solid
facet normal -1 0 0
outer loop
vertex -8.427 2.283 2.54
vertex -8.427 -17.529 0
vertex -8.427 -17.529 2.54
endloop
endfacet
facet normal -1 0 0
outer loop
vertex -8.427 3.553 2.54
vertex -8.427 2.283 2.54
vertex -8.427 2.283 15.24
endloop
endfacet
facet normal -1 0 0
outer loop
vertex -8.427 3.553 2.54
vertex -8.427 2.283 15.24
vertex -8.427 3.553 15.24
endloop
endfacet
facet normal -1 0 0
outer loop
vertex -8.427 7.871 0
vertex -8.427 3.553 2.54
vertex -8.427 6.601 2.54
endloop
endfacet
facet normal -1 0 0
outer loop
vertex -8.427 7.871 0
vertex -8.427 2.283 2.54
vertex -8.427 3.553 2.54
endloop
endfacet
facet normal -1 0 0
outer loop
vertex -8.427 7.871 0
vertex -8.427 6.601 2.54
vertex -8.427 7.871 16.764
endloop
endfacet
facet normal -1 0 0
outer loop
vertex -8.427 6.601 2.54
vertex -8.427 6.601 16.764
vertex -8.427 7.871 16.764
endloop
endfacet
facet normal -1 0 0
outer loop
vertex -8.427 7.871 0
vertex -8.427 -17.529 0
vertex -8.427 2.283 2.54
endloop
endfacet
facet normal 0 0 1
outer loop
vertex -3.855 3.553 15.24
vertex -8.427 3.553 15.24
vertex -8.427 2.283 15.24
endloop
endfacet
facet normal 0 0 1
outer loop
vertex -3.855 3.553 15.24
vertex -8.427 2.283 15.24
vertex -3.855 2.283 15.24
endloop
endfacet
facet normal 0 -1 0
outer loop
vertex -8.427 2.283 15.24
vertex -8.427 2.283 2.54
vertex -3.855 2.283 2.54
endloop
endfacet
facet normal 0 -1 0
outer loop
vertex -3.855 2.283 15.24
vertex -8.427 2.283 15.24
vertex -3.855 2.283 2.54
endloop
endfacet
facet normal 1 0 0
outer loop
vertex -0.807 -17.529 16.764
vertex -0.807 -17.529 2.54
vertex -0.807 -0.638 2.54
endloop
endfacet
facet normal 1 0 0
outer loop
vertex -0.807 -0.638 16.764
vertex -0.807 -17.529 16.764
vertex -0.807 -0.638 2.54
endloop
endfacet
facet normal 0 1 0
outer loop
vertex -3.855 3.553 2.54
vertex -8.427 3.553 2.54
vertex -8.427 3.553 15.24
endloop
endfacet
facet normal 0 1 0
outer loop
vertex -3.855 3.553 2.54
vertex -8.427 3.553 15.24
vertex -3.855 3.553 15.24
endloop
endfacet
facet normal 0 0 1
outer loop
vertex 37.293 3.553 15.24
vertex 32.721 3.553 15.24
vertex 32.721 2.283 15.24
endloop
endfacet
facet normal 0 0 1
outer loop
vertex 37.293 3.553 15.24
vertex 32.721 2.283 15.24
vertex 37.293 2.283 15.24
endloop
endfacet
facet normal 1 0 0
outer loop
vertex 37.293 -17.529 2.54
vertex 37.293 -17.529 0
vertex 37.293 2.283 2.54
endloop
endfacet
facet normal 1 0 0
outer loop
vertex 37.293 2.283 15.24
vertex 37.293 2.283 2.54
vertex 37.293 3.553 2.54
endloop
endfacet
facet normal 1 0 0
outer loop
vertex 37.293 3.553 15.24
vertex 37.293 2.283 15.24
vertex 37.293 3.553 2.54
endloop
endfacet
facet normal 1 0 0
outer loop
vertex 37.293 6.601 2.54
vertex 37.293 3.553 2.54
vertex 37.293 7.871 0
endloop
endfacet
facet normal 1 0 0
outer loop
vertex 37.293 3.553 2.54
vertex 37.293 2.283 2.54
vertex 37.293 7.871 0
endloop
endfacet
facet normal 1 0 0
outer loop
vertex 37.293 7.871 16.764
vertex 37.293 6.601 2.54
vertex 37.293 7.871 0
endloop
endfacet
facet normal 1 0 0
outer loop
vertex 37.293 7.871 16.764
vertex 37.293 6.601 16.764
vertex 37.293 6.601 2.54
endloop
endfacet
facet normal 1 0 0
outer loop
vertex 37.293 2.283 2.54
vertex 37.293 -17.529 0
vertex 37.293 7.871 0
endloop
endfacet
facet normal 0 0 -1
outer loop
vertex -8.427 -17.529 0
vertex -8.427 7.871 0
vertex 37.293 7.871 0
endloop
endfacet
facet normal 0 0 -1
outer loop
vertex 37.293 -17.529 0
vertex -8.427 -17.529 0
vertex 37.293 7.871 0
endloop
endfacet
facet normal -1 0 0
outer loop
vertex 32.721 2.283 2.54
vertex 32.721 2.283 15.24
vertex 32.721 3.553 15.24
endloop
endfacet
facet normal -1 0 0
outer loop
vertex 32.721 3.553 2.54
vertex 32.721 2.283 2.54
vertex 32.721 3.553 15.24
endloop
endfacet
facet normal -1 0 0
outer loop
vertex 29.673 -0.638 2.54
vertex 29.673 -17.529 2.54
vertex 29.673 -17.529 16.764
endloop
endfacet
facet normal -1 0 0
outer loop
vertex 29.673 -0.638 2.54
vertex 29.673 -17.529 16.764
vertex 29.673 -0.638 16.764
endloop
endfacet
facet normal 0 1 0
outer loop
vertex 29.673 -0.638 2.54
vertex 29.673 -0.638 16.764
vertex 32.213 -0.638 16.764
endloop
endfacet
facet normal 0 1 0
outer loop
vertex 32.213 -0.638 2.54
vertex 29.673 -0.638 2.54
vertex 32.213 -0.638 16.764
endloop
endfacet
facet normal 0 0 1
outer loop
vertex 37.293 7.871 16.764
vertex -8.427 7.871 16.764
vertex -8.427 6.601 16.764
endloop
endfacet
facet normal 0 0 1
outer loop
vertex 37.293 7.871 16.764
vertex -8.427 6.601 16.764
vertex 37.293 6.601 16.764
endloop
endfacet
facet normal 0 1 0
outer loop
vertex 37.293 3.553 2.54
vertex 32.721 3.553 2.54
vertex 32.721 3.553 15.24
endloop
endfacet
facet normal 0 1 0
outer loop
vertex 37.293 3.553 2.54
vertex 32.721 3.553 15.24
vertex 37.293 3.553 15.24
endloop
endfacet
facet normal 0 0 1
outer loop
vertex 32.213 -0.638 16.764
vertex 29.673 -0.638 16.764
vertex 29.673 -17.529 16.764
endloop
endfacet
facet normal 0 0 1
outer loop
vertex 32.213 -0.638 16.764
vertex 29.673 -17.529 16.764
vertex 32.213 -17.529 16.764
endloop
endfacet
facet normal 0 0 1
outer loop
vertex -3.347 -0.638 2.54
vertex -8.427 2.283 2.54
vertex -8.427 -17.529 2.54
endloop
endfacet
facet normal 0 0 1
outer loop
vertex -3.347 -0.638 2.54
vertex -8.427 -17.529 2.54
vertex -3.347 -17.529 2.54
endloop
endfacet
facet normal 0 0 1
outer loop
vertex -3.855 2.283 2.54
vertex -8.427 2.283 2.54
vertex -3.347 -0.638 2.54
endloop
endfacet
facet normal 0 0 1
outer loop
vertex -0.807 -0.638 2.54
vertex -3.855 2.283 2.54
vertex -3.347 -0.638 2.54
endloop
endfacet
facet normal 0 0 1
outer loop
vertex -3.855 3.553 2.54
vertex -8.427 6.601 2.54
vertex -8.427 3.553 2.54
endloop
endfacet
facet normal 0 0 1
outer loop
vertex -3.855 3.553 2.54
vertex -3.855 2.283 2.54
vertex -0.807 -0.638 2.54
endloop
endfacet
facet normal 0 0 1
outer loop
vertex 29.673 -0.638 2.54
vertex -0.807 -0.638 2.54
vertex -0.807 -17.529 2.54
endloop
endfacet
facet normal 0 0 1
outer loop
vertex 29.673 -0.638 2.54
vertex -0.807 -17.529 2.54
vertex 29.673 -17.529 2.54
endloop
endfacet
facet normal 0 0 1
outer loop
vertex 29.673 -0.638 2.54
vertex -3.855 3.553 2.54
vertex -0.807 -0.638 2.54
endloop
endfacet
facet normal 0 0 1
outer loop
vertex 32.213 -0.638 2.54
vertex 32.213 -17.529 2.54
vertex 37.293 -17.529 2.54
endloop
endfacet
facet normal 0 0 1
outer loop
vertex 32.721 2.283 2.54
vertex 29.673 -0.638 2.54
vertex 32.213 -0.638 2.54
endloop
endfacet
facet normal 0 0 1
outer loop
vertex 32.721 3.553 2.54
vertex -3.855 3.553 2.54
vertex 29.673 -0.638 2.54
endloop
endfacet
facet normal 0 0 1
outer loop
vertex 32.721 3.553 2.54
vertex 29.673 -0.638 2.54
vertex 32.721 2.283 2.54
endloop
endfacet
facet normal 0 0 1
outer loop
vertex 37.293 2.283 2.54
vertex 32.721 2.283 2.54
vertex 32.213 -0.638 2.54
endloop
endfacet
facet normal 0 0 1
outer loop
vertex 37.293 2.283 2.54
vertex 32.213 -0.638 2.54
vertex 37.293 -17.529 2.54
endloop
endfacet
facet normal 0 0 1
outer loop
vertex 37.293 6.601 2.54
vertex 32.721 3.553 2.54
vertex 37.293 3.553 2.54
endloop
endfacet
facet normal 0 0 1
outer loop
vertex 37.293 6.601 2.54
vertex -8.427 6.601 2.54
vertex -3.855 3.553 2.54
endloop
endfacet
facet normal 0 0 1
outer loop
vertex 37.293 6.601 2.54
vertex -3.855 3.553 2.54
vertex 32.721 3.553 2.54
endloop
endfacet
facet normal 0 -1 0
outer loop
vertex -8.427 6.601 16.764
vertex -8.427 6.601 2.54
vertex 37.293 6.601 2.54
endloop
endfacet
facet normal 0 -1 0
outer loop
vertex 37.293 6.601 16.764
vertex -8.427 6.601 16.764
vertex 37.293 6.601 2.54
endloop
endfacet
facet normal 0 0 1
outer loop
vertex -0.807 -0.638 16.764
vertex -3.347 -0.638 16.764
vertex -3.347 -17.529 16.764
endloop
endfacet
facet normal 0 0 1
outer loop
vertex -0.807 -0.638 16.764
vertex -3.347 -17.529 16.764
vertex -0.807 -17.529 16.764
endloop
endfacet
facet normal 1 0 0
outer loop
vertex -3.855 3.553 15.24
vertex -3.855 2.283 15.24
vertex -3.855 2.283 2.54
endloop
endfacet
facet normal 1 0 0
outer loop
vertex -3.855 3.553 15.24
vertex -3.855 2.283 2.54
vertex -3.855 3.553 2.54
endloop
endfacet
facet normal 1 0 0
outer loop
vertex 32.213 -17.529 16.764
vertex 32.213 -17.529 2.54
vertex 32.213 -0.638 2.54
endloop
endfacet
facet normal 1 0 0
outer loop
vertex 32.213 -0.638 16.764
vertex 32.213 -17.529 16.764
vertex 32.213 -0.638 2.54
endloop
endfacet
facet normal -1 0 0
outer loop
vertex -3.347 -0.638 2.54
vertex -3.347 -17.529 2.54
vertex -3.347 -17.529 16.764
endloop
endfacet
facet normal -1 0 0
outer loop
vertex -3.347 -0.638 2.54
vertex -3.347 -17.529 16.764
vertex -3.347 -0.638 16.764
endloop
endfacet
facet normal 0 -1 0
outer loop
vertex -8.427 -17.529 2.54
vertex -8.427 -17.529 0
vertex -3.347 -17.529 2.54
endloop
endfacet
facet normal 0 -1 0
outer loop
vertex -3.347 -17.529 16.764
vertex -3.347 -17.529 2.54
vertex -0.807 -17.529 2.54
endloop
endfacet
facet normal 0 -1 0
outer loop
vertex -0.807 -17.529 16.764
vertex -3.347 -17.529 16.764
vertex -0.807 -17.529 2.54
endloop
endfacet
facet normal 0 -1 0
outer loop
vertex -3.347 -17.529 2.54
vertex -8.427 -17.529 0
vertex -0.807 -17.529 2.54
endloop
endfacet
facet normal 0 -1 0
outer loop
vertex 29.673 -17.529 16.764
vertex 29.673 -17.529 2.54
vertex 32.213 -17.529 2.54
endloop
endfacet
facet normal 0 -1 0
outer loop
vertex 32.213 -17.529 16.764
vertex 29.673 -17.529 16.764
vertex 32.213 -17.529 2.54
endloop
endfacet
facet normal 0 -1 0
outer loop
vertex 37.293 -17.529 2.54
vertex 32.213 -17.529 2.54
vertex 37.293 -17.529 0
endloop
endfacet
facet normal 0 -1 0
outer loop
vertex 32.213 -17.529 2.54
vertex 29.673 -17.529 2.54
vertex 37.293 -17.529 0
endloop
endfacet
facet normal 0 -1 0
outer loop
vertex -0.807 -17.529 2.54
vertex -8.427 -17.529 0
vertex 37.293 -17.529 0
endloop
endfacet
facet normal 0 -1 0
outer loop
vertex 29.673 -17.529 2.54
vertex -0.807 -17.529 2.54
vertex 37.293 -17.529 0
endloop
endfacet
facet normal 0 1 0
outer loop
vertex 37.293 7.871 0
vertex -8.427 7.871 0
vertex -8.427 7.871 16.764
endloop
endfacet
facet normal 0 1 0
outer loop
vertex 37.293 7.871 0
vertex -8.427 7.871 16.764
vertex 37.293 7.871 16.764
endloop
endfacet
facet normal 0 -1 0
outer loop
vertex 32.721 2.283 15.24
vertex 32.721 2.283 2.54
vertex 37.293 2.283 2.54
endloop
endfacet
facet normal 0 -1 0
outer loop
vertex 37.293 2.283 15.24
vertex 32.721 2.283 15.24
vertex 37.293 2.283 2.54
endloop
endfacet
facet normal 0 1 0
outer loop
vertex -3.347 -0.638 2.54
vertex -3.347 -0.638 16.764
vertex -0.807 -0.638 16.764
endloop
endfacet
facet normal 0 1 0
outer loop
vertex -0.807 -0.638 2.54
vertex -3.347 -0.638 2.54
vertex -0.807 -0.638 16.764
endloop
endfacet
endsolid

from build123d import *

# Parameters (mm, degrees)
F0_W     = 45.72
F0_H     = 25.4
F1_DEPTH = 2.54
F2_W     = 2.54
F2_H     = 16.891
F3_DEPTH = 14.224
F4_W     = 45.72
F4_H     = 1.27
F5_DEPTH = 14.224
F6_W     = 4.572
F6_H     = 1.27
F7_DEPTH = 12.7


with BuildPart() as f1:
    # F0 (on Top) → F1 (new body)
    with BuildSketch(Plane.XY):
        with Locations((14.433108, -4.829161)):
            Rectangle(F0_W, F0_H)
    extrude(amount=F1_DEPTH)

    # F2 (on face) → F3 (join)
    with BuildSketch(Plane.XY.offset(2.54)):
        with Locations((-2.076892, -9.083661)):
            Rectangle(F2_W, F2_H)
        with Locations((30.943108, -9.083661)):
            Rectangle(F2_W, F2_H)
    extrude(amount=F3_DEPTH)

    # F4 (on face) → F5 (join)
    with BuildSketch(Plane.XY.offset(2.54)):
        with Locations((14.433108, 7.235839)):
            Rectangle(F4_W, F4_H)
    extrude(amount=F5_DEPTH)

    # F6 (on face) → F7 (join)
    with BuildSketch(Plane.XY.offset(2.54)):
        with Locations((-6.140892, 2.917839)):
            Rectangle(F6_W, F6_H)
        with Locations((35.007108, 2.917839)):
            Rectangle(F6_W, F6_H)
    extrude(amount=F7_DEPTH)


solid = f1.part
